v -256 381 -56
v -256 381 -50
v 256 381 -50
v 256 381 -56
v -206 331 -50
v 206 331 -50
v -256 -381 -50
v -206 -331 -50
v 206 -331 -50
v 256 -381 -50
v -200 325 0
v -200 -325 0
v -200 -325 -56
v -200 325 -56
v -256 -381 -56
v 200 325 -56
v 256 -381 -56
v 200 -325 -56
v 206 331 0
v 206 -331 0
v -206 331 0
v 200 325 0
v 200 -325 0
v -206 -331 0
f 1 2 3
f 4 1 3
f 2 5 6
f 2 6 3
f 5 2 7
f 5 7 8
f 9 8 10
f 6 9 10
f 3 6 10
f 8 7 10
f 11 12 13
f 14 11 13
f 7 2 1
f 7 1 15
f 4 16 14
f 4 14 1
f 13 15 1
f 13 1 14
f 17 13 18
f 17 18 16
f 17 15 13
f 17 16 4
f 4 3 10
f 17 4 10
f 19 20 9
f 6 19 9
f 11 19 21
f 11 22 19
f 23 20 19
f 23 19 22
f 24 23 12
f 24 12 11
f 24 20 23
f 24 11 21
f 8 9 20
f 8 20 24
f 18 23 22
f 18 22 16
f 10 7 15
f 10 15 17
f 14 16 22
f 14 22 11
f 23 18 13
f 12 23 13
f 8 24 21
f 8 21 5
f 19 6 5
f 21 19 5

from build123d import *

# Parameters (mm, degrees)
SKETCH054_W            = 400
SKETCH054_H            = 60
PAD003_DEPTH           = 325
SKETCH055_W            = 412
SKETCH055_H            = 50
PAD008_DEPTH           = 331
SKETCH056_W            = 512
SKETCH056_H            = 762
PAD009_DEPTH           = 6
CUT003_PLACEMENT_ANGLE = 180


with BuildPart() as body002:
    # Sketch054 → Pad003 (new body, symmetric)
    with BuildSketch(Plane.XZ):
        with Locations((0, 30)):
            Rectangle(SKETCH054_W, SKETCH054_H)
    extrude(amount=PAD003_DEPTH, both=True)


with BuildPart() as cut003:
    # Sketch055 → Pad008 (new body, symmetric)
    with BuildSketch(Plane.XZ):
        with Locations((0, 25)):
            Rectangle(SKETCH055_W, SKETCH055_H)
    extrude(amount=PAD008_DEPTH, both=True)

    # Sketch056 (on Face3 of Pad008) → Pad009 (join)
    with BuildSketch(Plane(origin=(0, 0, 50), x_dir=(-1, 0, 0), z_dir=(0, 0, 1))):
        Rectangle(SKETCH056_W, SKETCH056_H)
    extrude(amount=PAD009_DEPTH)

    # Cut003: cut Body002
    add(body002.part, mode=Mode.SUBTRACT)


with BuildPart() as cut003_1:
    # Cut003 placement: moved
    add(cut003.part.rotate(Axis((0, 0, 0), (0, 1, 0)), CUT003_PLACEMENT_ANGLE))


solid = cut003_1.part
